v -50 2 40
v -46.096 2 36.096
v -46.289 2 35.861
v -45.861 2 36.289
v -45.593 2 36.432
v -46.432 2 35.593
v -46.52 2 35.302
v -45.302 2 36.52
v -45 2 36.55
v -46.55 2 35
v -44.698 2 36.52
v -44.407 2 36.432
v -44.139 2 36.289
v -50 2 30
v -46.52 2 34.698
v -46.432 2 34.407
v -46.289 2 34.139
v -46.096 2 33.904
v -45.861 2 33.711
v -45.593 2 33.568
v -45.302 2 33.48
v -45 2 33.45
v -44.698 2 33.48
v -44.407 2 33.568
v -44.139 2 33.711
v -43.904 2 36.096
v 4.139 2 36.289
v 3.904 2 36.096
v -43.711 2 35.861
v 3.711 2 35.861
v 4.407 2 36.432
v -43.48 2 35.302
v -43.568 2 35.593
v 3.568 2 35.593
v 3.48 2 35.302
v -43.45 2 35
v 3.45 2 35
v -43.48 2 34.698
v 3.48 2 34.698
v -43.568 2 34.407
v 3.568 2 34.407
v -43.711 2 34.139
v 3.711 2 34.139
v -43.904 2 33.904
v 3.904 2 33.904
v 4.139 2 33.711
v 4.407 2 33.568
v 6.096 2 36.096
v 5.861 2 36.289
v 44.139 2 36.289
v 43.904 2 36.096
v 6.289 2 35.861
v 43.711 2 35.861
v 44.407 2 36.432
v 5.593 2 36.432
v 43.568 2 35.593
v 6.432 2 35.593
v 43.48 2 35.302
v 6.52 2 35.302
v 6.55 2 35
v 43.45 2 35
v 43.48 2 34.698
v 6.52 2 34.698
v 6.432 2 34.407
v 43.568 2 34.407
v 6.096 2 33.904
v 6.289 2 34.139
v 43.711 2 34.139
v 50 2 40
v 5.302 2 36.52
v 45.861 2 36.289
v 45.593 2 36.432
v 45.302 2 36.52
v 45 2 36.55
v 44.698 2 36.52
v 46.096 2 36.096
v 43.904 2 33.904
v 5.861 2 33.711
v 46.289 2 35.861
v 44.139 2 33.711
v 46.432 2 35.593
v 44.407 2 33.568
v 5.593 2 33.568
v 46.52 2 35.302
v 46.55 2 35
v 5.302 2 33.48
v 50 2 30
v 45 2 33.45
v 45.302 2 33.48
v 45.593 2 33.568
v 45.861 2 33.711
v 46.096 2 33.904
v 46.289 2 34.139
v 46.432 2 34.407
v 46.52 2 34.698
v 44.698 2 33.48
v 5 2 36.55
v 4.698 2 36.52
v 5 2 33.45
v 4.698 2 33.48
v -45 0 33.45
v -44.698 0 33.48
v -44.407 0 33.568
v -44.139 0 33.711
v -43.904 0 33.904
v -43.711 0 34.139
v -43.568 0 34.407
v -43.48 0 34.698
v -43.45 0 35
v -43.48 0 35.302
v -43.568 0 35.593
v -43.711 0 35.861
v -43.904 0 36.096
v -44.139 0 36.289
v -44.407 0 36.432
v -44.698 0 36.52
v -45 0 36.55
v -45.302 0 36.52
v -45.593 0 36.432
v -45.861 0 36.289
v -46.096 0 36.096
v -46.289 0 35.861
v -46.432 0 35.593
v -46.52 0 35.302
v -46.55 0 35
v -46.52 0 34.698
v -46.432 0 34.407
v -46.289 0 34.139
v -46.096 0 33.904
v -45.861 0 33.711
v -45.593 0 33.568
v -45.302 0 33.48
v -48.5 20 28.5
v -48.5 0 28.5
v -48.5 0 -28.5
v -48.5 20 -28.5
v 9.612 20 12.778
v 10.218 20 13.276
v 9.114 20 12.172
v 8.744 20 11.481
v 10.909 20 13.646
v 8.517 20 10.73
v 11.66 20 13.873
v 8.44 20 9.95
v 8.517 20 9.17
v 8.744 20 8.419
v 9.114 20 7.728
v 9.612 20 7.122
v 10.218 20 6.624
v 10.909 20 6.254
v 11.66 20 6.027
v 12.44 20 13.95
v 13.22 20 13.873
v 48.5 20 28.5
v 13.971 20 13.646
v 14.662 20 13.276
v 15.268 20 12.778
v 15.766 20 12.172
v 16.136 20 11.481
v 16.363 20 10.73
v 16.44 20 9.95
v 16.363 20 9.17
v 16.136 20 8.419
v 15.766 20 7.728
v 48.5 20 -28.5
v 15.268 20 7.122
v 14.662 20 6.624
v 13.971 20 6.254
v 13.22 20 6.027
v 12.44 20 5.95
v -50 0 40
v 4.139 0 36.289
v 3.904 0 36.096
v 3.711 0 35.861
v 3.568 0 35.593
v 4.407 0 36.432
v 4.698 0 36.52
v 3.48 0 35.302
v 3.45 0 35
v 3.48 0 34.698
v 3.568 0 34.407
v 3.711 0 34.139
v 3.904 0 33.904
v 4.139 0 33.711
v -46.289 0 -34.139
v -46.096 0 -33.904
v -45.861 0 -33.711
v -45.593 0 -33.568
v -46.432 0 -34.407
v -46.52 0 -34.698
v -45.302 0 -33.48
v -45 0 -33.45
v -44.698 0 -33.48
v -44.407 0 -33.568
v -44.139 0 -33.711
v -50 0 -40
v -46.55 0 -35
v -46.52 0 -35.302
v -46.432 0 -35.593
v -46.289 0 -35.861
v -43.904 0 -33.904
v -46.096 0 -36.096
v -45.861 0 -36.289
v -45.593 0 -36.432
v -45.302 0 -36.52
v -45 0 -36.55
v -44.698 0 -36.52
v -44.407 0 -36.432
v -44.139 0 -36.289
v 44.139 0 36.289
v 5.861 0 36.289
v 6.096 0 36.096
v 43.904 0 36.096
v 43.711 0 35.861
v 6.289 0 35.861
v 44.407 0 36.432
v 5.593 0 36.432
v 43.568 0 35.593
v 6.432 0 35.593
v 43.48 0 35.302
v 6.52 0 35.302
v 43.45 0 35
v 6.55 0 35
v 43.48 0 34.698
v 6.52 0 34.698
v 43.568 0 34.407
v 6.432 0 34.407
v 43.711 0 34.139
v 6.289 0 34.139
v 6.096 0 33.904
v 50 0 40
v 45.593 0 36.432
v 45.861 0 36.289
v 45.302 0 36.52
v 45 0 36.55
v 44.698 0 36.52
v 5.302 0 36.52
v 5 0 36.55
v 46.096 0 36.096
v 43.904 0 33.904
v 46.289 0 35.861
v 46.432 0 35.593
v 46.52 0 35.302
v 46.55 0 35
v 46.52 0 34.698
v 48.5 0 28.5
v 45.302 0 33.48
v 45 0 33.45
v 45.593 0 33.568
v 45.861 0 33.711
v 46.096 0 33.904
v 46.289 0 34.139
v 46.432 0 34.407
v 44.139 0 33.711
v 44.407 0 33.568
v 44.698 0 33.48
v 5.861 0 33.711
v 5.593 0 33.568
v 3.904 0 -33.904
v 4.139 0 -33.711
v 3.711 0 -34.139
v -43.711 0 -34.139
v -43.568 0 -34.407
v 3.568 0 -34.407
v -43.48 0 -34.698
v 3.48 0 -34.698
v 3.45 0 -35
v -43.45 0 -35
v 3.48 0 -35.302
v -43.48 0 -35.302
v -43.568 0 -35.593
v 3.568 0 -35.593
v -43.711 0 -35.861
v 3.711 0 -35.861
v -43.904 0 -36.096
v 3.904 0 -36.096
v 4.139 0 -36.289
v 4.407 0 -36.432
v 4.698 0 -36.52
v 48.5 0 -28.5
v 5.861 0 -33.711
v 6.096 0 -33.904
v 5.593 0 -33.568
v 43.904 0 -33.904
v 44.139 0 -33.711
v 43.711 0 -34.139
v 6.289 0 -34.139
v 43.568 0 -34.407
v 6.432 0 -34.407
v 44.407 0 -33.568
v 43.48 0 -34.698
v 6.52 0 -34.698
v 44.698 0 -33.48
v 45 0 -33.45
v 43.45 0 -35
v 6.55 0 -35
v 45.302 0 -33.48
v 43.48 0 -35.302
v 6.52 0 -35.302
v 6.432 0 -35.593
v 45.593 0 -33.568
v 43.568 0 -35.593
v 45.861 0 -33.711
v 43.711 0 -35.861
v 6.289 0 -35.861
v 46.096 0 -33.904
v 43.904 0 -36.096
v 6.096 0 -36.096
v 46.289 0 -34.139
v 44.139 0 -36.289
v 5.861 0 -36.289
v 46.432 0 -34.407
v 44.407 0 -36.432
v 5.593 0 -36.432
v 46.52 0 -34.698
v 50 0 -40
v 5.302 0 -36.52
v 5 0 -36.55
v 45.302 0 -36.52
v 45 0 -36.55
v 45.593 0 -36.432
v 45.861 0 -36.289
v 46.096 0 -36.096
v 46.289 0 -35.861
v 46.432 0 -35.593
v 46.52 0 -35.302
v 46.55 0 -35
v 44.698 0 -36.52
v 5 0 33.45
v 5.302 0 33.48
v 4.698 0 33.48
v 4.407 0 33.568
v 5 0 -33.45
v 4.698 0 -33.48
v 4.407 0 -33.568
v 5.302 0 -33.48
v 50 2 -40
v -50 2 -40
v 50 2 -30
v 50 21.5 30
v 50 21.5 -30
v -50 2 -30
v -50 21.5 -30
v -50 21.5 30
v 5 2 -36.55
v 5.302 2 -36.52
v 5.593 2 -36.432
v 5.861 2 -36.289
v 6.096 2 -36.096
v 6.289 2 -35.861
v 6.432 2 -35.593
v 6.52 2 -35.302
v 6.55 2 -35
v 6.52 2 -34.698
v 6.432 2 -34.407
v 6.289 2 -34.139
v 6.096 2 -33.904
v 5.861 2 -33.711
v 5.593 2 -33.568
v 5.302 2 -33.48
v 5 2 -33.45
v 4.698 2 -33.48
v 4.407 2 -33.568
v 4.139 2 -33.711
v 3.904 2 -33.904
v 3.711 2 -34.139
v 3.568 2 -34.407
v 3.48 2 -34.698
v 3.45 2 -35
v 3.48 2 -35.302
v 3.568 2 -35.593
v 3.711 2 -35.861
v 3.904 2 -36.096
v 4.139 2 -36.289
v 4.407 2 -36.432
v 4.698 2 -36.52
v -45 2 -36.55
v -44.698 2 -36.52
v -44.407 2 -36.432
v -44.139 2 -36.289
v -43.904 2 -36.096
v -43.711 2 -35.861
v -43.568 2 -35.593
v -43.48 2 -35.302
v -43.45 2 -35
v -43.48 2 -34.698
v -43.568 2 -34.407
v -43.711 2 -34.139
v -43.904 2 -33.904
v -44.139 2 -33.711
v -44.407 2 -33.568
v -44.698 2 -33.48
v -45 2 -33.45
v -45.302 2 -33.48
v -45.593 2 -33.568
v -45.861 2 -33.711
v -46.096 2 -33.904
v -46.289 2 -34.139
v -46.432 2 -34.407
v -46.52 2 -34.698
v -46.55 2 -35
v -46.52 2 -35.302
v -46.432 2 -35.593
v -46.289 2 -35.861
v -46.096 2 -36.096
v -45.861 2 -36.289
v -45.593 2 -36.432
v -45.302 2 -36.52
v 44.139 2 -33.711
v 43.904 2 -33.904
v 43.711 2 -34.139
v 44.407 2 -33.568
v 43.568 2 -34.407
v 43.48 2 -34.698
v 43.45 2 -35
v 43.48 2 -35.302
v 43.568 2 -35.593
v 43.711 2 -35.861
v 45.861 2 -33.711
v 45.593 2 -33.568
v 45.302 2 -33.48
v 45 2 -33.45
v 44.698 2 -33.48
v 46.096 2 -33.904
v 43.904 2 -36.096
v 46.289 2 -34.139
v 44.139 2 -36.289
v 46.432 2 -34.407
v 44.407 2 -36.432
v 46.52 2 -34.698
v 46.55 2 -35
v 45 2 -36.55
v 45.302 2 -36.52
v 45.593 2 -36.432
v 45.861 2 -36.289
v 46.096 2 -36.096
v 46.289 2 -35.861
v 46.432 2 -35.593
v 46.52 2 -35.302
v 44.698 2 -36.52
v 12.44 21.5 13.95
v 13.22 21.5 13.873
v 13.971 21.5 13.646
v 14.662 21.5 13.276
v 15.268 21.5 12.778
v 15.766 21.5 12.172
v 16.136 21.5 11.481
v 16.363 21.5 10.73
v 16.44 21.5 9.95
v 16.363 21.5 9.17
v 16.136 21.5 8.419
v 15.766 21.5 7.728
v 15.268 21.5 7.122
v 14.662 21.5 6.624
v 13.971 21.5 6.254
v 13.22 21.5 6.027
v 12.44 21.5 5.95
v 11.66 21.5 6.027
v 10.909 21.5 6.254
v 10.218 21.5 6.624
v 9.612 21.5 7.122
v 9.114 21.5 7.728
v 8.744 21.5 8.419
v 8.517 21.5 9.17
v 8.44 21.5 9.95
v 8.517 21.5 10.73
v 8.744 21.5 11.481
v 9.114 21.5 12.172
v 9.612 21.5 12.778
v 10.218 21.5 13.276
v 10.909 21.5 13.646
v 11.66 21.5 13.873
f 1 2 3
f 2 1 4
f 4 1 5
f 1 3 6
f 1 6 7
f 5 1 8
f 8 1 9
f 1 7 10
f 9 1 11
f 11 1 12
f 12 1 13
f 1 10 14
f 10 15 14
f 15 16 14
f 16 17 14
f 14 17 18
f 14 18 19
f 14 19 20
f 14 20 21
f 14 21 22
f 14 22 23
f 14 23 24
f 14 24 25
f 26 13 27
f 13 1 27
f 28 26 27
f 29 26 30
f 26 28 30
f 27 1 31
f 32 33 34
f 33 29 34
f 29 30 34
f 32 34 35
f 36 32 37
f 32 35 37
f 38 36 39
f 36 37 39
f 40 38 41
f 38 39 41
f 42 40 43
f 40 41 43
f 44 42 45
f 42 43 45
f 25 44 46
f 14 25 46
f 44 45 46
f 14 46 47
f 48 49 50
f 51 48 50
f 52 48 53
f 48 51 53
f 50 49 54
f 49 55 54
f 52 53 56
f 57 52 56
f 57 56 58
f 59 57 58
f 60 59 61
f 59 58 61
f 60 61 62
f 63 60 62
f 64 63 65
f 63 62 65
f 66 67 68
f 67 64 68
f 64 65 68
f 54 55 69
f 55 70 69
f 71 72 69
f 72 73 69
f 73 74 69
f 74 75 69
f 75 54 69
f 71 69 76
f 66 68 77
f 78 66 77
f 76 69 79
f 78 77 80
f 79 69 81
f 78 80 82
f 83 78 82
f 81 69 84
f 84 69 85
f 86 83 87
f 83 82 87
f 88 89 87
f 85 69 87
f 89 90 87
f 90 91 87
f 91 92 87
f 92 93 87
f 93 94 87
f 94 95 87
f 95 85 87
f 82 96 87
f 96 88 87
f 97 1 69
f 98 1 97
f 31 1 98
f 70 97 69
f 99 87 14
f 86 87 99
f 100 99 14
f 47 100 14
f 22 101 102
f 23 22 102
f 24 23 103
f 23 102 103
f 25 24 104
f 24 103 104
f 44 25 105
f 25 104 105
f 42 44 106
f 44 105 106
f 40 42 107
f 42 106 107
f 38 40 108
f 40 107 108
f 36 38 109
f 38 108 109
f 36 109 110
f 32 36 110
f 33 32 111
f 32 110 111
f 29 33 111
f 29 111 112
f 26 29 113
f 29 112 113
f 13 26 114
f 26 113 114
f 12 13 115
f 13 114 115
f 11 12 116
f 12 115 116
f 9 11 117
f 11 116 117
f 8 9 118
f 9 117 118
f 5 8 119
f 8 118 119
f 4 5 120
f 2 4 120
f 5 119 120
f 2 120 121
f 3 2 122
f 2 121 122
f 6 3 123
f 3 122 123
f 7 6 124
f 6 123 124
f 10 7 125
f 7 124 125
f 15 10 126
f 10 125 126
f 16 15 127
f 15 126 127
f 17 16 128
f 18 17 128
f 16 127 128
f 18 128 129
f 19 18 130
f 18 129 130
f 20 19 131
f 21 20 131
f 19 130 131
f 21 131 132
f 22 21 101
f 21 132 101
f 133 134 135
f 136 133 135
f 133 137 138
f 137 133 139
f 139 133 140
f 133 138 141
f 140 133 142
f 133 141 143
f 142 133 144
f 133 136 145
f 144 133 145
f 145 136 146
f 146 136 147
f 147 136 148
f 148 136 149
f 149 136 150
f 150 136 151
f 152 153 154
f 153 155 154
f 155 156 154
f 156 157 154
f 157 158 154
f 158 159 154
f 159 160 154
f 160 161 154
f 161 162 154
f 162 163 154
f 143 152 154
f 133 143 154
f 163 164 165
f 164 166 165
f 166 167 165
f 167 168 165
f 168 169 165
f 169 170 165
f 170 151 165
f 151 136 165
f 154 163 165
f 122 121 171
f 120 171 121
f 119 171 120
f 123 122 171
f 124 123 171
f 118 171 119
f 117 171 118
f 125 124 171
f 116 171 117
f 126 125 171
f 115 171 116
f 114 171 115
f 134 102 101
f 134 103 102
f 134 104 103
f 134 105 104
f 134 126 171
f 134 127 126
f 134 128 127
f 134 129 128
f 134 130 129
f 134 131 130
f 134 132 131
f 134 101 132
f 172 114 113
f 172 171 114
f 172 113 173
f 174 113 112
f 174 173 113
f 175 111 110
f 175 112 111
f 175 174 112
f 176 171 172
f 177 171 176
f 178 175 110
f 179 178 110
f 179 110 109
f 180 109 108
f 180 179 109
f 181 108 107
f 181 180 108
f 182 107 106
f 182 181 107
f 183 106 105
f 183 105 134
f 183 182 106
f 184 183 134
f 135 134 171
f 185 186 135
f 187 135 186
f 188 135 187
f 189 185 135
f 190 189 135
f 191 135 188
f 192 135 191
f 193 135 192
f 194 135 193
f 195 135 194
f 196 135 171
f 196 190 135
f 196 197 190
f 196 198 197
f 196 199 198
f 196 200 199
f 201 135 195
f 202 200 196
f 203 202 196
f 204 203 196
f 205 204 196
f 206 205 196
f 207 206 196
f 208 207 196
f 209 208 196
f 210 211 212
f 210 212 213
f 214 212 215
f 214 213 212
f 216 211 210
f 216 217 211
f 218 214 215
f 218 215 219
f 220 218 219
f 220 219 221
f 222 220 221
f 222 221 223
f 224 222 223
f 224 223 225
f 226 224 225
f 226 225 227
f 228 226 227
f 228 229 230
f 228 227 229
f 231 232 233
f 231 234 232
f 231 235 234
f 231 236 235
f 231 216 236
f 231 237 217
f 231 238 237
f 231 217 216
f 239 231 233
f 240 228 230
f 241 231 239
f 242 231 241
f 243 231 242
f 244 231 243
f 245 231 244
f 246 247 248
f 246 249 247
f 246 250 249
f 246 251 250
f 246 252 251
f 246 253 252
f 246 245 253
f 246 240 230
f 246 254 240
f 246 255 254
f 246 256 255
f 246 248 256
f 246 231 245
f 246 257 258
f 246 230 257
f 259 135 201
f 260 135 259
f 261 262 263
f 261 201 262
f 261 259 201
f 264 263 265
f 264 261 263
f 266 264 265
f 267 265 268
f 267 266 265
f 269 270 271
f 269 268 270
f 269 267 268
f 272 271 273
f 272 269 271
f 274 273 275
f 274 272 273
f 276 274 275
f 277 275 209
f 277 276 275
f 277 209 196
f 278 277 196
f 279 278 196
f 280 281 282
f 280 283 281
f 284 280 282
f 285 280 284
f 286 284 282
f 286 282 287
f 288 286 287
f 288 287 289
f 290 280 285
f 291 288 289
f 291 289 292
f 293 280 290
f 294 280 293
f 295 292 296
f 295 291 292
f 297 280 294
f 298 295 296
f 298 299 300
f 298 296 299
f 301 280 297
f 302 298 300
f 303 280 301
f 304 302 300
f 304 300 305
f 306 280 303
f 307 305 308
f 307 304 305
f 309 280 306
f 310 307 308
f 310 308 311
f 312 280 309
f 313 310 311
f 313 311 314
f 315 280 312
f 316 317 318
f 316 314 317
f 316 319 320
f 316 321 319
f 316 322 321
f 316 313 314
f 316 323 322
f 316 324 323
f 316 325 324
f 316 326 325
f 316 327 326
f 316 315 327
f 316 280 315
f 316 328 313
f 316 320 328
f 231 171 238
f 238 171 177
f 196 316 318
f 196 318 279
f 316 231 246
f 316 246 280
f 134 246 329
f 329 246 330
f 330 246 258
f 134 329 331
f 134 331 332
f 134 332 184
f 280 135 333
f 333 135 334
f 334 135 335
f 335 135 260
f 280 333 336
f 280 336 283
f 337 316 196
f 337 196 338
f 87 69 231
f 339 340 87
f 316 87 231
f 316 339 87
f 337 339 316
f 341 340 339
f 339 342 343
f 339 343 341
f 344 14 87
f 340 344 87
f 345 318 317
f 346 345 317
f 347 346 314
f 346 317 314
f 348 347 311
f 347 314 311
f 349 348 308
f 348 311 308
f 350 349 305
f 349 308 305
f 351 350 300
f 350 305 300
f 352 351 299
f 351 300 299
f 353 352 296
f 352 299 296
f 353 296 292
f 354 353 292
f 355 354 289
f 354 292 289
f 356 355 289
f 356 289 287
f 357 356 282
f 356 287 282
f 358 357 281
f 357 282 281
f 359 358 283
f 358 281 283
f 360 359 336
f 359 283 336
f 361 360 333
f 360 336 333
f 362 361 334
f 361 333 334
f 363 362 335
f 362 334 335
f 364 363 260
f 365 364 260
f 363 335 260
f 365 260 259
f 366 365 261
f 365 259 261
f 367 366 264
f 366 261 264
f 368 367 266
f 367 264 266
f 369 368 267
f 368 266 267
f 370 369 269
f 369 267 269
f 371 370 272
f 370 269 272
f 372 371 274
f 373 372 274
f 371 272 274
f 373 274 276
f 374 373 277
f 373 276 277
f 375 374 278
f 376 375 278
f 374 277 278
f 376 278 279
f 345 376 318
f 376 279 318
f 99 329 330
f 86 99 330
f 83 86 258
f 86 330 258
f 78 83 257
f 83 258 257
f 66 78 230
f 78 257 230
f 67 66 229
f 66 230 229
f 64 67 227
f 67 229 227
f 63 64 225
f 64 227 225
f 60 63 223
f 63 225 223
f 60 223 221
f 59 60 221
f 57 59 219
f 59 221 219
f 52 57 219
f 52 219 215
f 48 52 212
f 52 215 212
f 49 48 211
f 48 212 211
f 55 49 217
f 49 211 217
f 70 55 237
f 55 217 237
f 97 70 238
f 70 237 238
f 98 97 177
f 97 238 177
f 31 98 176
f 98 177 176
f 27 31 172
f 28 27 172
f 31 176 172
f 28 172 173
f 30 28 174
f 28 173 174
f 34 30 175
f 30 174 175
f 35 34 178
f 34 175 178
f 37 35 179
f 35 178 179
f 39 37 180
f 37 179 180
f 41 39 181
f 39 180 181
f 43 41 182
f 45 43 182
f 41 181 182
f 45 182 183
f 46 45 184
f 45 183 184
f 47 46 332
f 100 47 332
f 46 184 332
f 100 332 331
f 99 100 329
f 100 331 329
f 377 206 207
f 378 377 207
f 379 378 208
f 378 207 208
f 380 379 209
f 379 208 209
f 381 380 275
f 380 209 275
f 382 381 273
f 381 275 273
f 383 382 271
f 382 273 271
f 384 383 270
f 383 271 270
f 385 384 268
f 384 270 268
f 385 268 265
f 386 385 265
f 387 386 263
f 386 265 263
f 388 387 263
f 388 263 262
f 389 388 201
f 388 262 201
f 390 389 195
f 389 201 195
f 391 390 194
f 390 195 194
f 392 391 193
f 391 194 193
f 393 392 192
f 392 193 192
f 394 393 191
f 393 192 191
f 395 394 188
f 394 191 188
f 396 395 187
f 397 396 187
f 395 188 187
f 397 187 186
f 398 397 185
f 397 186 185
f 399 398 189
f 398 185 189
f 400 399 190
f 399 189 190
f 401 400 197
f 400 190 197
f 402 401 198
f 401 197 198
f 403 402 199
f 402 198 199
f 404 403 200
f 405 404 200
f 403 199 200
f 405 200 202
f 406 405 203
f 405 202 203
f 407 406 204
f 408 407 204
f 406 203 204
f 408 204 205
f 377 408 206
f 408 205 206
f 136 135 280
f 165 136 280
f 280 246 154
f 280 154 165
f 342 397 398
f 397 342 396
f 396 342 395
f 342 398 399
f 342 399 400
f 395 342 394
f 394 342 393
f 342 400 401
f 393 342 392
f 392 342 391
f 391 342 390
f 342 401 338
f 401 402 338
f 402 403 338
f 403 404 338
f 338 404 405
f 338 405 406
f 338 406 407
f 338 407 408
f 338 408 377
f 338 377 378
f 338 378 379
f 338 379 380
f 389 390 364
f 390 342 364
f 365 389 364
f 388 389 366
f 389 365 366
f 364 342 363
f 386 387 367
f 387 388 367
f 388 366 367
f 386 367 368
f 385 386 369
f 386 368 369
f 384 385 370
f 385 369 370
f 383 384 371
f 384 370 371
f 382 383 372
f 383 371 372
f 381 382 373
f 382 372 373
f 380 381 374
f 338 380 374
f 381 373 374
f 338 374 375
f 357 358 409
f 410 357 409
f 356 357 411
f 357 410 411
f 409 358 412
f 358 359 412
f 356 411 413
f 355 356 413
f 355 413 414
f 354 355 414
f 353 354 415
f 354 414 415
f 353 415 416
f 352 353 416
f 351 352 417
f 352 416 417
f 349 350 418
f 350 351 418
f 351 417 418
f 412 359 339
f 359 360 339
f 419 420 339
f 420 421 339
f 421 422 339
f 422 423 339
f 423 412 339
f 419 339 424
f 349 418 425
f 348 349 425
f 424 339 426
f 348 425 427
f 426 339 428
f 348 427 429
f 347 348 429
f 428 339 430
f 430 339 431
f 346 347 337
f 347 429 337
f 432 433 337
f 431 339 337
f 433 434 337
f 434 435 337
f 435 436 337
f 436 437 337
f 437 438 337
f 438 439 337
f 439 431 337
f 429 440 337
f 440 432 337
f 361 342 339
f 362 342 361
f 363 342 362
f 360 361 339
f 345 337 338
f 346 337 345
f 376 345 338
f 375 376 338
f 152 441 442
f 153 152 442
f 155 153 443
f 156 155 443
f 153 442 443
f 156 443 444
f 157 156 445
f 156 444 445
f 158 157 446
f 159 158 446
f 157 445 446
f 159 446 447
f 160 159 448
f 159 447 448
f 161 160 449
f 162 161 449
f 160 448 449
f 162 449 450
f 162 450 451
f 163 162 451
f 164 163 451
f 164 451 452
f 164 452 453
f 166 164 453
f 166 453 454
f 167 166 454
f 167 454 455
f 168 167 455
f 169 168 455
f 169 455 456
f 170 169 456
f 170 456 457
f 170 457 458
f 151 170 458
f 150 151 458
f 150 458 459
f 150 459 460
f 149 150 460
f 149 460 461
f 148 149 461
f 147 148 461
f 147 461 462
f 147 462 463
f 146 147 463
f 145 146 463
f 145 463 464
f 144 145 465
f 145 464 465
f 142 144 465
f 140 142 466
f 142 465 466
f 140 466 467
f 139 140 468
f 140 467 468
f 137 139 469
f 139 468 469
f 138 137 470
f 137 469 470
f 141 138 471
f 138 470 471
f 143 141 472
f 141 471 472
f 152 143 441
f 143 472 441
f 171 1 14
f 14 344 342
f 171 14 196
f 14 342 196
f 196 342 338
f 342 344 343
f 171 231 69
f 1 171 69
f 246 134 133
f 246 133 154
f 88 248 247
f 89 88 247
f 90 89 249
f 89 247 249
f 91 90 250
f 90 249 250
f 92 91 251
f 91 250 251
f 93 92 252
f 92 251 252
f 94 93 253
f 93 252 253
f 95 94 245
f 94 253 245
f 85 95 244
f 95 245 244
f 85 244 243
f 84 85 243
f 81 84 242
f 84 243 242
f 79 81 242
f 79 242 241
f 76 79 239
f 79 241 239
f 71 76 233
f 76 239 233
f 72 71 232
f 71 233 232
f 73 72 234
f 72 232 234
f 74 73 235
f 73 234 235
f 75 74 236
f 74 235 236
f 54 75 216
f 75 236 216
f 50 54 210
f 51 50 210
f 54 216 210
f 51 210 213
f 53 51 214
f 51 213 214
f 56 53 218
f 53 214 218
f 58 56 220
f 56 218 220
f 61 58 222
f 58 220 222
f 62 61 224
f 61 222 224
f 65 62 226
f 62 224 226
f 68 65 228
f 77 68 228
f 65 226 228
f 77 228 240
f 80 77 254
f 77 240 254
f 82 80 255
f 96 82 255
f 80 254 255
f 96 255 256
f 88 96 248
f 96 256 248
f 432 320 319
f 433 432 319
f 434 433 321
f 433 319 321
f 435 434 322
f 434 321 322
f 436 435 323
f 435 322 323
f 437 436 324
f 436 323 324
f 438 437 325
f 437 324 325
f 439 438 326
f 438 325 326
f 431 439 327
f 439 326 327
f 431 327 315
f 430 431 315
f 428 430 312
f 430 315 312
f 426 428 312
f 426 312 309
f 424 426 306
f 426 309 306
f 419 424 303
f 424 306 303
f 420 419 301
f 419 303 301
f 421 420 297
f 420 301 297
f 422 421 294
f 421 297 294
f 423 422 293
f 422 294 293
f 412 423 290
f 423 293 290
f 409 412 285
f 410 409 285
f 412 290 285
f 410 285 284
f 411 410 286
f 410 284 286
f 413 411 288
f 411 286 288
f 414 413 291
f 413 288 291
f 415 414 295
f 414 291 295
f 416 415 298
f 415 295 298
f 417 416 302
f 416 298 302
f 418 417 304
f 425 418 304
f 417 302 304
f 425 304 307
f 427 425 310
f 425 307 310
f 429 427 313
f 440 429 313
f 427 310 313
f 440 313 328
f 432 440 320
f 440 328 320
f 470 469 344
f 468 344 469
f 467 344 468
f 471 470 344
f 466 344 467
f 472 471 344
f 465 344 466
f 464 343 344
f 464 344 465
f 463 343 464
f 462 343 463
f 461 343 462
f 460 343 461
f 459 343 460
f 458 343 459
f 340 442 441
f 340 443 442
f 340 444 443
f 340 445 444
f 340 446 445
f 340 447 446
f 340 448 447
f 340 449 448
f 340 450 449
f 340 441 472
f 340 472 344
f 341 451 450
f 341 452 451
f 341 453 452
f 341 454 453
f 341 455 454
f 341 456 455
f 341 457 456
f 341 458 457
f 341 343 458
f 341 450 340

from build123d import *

# Parameters (mm, degrees)
SKETCH1_W           = 100
SKETCH1_H           = 60
SKETCH1_W_2         = 97
SKETCH1_H_2         = 57
BOSS_EXTRUDE1_DEPTH = 20
SKETCH2_W           = 100
SKETCH2_H           = 60
BOSS_EXTRUDE2_DEPTH = 1.5
SKETCH3_W           = 10
SKETCH3_H           = 2
BOSS_EXTRUDE3_DEPTH = 100
SKETCH4_R           = 1.55
CUT_EXTRUDE1_DEPTH  = 2
SKETCH5_R           = 4
CUT_EXTRUDE2_DEPTH  = 3


with BuildPart() as part:
    # Sketch1 → Boss-Extrude1 (new body)
    with BuildSketch(Plane(origin=(0, 0, 0), x_dir=(1, 0, 0), z_dir=(0, 1, 0))):
        Rectangle(SKETCH1_W, SKETCH1_H)
        Rectangle(SKETCH1_W_2, SKETCH1_H_2, mode=Mode.SUBTRACT)
    extrude(amount=BOSS_EXTRUDE1_DEPTH)

    # Sketch2 → Boss-Extrude2 (add)
    with BuildSketch(Plane(origin=(0, 20, 0), x_dir=(1, 0, 0), z_dir=(0, 1, 0))):
        Rectangle(SKETCH2_W, SKETCH2_H)
    extrude(amount=BOSS_EXTRUDE2_DEPTH)

    # Sketch3 → Boss-Extrude3 (add)
    with BuildSketch(Plane(origin=(50, 0, 0), x_dir=(0, 0, -1), z_dir=(1, 0, 0))):
        with Locations((-35, 1)):
            Rectangle(SKETCH3_W, SKETCH3_H)
        with Locations((35, 1)):
            Rectangle(SKETCH3_W, SKETCH3_H)
    extrude(amount=-BOSS_EXTRUDE3_DEPTH)

    # Sketch4 → Cut-Extrude1 (cut)
    with BuildSketch(Plane.XZ):
        with Locations(Location((-45, 35, 0), (0, 0, 270))):
            Circle(SKETCH4_R)
        with Locations(Location((45, 35, 0), (0, 0, 270))):
            Circle(SKETCH4_R)
        with Locations(Location((45, -35, 0), (0, 0, 270))):
            Circle(SKETCH4_R)
        with Locations(Location((-45, -35, 0), (0, 0, 270))):
            Circle(SKETCH4_R)
        with Locations(Location((5, 35, 0), (0, 0, 270))):
            Circle(SKETCH4_R)
        with Locations(Location((5, -35, 0), (0, 0, 270))):
            Circle(SKETCH4_R)
    extrude(amount=-CUT_EXTRUDE1_DEPTH, mode=Mode.SUBTRACT)

    # Sketch5 → Cut-Extrude2 (cut)
    with BuildSketch(Plane(origin=(0, 21.5, 0), x_dir=(1, 0, 0), z_dir=(0, 1, 0))):
        with Locations(Location((12.44, -9.95, 0), (0, 0, 270))):
            Circle(SKETCH5_R)
    extrude(amount=-CUT_EXTRUDE2_DEPTH, mode=Mode.SUBTRACT)


solid = part.part
